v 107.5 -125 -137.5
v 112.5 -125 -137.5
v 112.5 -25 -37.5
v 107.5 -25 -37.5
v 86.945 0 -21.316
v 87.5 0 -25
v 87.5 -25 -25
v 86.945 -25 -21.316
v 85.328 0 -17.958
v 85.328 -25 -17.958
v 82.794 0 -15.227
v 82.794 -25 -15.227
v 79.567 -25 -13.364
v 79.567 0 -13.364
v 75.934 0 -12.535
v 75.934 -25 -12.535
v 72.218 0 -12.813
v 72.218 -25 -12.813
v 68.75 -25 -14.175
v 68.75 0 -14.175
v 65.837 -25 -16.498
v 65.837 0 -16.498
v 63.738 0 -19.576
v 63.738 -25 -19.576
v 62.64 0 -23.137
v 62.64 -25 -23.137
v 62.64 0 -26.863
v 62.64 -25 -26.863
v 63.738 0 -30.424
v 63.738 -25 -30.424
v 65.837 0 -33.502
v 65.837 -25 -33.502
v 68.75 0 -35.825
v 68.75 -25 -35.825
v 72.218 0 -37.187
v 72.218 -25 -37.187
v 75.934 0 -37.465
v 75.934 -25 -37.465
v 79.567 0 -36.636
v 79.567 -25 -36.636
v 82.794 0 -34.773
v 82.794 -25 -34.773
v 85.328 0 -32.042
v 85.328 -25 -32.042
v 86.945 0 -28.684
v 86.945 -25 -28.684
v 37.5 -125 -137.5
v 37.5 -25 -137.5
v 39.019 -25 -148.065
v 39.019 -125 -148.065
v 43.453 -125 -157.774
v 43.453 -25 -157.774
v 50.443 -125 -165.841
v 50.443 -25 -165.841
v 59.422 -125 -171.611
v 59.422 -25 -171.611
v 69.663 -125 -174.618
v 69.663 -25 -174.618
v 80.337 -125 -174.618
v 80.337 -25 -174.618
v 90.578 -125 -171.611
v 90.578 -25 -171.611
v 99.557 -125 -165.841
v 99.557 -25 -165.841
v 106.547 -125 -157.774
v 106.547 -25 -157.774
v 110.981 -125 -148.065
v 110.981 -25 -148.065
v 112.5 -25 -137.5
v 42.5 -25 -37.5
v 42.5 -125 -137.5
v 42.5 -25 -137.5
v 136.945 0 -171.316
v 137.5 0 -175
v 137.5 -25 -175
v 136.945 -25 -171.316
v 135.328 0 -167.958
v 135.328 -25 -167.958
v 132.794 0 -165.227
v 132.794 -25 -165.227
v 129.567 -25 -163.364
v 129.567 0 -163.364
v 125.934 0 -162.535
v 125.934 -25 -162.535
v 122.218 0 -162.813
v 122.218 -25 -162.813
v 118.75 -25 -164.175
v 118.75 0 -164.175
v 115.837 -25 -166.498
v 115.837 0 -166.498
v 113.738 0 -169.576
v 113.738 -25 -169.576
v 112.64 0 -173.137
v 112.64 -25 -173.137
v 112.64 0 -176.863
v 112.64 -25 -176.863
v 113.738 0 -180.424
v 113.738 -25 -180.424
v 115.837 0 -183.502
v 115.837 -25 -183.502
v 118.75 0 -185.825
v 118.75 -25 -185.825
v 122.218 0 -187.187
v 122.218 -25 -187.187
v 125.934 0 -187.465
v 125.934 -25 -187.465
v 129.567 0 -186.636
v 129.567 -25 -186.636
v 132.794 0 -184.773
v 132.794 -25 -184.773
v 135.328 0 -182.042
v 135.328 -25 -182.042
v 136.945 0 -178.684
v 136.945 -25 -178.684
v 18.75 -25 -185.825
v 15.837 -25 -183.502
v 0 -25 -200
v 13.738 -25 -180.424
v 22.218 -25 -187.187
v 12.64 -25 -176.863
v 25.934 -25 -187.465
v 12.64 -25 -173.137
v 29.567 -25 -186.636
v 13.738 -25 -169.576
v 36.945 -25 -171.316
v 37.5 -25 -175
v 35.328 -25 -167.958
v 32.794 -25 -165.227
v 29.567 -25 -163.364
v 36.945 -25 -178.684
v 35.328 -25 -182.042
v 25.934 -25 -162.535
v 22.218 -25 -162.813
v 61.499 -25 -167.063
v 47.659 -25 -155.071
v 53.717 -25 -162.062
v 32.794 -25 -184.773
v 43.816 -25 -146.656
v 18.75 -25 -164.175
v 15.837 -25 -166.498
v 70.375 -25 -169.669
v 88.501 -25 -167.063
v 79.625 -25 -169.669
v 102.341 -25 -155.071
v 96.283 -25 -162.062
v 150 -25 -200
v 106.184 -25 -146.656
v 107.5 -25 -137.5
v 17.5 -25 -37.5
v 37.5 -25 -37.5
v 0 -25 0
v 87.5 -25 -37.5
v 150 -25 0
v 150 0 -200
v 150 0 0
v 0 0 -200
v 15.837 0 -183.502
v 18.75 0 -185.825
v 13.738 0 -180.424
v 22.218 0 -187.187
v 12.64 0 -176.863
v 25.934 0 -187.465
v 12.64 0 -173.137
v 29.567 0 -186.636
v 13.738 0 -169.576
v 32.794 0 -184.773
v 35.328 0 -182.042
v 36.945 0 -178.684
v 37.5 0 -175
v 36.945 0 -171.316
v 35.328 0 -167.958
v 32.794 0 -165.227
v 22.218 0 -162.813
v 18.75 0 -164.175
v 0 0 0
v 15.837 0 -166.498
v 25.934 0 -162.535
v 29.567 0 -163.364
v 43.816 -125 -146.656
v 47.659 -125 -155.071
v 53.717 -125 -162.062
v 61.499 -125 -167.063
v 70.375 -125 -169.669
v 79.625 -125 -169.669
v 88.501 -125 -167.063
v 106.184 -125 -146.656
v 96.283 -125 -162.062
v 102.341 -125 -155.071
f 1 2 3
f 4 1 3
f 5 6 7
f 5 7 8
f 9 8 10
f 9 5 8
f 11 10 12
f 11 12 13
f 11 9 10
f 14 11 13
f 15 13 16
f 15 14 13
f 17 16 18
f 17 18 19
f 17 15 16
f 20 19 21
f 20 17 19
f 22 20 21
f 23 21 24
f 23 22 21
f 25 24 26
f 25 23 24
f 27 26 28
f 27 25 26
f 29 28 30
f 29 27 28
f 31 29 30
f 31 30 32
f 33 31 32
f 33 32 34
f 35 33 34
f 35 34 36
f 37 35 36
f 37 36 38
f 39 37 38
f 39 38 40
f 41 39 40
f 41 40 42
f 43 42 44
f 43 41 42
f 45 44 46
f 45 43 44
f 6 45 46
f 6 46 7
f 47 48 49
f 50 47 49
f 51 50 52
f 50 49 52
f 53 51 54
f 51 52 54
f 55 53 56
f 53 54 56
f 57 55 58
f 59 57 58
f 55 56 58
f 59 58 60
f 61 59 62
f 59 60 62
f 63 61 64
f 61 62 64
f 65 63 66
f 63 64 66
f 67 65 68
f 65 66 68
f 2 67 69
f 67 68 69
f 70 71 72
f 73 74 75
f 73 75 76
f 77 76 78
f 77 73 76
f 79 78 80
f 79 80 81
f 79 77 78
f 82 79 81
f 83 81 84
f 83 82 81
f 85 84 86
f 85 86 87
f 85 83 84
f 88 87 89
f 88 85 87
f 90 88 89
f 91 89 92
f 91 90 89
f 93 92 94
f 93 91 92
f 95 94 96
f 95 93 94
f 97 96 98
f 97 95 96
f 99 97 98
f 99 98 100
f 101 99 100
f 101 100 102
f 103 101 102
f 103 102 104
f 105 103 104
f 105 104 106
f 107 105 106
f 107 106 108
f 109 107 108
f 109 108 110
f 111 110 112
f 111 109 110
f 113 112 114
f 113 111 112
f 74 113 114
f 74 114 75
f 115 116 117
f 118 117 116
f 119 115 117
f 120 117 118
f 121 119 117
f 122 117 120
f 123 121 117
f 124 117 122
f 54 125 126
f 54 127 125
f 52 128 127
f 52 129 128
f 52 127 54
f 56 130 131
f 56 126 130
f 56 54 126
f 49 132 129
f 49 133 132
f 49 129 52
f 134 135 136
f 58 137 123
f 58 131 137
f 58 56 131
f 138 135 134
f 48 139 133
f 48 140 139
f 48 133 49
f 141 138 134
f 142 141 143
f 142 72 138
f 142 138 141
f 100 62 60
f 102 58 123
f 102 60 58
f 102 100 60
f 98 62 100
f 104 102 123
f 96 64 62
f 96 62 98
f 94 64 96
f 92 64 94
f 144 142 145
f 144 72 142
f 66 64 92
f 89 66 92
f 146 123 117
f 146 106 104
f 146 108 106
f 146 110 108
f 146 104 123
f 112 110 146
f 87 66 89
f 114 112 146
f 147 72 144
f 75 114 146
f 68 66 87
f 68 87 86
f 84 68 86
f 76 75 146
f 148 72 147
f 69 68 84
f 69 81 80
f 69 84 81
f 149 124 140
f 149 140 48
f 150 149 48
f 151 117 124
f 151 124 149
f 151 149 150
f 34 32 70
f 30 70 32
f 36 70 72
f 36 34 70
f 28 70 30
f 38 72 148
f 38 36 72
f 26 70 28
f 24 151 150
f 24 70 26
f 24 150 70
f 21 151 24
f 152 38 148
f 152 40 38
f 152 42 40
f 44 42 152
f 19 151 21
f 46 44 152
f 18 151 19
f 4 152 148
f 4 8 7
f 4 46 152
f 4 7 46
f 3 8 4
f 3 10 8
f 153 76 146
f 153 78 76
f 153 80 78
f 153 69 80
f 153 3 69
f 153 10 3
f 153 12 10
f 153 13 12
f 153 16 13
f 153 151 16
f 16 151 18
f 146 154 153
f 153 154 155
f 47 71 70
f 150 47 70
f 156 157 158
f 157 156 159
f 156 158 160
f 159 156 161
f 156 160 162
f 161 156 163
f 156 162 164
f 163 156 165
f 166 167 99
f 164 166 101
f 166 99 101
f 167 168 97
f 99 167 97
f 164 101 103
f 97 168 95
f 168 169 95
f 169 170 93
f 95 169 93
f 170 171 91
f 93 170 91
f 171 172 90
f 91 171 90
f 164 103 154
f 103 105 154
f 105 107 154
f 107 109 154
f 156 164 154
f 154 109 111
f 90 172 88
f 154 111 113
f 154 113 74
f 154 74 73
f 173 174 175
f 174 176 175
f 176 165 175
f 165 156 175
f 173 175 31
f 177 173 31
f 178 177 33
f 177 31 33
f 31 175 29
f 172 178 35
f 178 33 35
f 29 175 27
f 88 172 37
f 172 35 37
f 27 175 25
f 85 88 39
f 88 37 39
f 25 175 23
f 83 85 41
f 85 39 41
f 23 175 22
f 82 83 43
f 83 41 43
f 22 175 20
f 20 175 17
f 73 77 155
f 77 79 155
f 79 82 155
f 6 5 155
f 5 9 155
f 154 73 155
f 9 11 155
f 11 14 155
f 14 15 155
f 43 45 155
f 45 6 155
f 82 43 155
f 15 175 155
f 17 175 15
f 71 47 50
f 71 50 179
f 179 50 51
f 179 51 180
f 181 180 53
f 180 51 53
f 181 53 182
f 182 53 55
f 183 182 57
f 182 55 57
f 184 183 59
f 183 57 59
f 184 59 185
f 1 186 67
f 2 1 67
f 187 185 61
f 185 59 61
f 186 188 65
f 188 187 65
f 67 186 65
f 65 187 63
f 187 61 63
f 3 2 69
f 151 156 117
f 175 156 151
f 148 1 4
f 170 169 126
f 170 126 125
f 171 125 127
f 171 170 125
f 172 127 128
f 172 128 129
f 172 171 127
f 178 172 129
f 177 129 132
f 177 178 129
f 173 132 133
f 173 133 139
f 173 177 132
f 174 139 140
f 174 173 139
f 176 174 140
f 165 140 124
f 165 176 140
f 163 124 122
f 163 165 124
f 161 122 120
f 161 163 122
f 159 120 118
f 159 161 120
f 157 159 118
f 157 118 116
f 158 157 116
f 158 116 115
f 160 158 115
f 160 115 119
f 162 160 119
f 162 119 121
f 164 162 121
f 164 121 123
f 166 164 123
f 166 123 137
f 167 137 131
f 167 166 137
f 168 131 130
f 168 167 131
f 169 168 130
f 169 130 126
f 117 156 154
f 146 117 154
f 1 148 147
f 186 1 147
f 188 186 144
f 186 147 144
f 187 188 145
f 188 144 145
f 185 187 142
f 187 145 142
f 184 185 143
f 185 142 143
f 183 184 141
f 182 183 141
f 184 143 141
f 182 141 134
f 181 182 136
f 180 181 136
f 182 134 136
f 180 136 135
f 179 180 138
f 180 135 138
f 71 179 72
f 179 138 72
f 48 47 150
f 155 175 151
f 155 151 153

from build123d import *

# Parameters (mm, degrees)
F0_W      = 150
F0_H      = 200
F0_R      = 12.5
F1_DEPTH  = 25
F3_DEPTH  = 100
F4_W      = 5
F4_H      = 100
F5_DEPTH  = 100
F7_DEPTH  = 25
F8_W      = 5
F8_H      = 100
F9_DEPTH  = 100
F11_DEPTH = 25


with BuildPart() as f1:
    # F0 (on Front) → F1 (new body)
    with BuildSketch(Plane.XZ):
        with Locations((75, -100)):
            Rectangle(F0_W, F0_H)
        with Locations((25, -175)):
            Circle(F0_R, mode=Mode.SUBTRACT)
        with Locations((125, -175)):
            Circle(F0_R, mode=Mode.SUBTRACT)
        with Locations((75, -25)):
            Circle(F0_R, mode=Mode.SUBTRACT)
    extrude(amount=F1_DEPTH)

    # F2 (on face) → F3 (join)
    with BuildSketch(Plane.XZ.offset(25)):
        with BuildLine():
            Line((42.5, -137.5), (37.5, -137.5))
            ThreePointArc((37.5, -137.5), (75, -175), (112.5, -137.5))
            Line((112.5, -137.5), (107.5, -137.5))
            ThreePointArc((107.5, -137.5), (75, -170), (42.5, -137.5))
        make_face()
    extrude(amount=F3_DEPTH)

    # F4 (on face) → F5 (join)
    with BuildSketch(Plane.XY.offset(-137.5)):
        with Locations((110, -75)):
            Rectangle(F4_W, F4_H)
    extrude(amount=F5_DEPTH)

    # F6 (on face) → F7 (cut)
    with BuildSketch(Plane.YZ.offset(112.5)):
        Polygon((-125, -37.5), (-125, -137.5), (-25, -37.5), align=None)
    extrude(amount=-F7_DEPTH, mode=Mode.SUBTRACT)

    # F8 (on face) → F9 (join)
    with BuildSketch(Plane.XY.offset(-137.5)):
        with Locations((40, -75)):
            Rectangle(F8_W, F8_H)
    extrude(amount=F9_DEPTH)

    # F10 (on face) → F11 (cut)
    with BuildSketch(Plane.YZ.offset(42.5)):
        Polygon((-125, -37.5), (-125, -137.5), (-25, -37.5), align=None)
    extrude(amount=-F11_DEPTH, mode=Mode.SUBTRACT)


solid = f1.part
